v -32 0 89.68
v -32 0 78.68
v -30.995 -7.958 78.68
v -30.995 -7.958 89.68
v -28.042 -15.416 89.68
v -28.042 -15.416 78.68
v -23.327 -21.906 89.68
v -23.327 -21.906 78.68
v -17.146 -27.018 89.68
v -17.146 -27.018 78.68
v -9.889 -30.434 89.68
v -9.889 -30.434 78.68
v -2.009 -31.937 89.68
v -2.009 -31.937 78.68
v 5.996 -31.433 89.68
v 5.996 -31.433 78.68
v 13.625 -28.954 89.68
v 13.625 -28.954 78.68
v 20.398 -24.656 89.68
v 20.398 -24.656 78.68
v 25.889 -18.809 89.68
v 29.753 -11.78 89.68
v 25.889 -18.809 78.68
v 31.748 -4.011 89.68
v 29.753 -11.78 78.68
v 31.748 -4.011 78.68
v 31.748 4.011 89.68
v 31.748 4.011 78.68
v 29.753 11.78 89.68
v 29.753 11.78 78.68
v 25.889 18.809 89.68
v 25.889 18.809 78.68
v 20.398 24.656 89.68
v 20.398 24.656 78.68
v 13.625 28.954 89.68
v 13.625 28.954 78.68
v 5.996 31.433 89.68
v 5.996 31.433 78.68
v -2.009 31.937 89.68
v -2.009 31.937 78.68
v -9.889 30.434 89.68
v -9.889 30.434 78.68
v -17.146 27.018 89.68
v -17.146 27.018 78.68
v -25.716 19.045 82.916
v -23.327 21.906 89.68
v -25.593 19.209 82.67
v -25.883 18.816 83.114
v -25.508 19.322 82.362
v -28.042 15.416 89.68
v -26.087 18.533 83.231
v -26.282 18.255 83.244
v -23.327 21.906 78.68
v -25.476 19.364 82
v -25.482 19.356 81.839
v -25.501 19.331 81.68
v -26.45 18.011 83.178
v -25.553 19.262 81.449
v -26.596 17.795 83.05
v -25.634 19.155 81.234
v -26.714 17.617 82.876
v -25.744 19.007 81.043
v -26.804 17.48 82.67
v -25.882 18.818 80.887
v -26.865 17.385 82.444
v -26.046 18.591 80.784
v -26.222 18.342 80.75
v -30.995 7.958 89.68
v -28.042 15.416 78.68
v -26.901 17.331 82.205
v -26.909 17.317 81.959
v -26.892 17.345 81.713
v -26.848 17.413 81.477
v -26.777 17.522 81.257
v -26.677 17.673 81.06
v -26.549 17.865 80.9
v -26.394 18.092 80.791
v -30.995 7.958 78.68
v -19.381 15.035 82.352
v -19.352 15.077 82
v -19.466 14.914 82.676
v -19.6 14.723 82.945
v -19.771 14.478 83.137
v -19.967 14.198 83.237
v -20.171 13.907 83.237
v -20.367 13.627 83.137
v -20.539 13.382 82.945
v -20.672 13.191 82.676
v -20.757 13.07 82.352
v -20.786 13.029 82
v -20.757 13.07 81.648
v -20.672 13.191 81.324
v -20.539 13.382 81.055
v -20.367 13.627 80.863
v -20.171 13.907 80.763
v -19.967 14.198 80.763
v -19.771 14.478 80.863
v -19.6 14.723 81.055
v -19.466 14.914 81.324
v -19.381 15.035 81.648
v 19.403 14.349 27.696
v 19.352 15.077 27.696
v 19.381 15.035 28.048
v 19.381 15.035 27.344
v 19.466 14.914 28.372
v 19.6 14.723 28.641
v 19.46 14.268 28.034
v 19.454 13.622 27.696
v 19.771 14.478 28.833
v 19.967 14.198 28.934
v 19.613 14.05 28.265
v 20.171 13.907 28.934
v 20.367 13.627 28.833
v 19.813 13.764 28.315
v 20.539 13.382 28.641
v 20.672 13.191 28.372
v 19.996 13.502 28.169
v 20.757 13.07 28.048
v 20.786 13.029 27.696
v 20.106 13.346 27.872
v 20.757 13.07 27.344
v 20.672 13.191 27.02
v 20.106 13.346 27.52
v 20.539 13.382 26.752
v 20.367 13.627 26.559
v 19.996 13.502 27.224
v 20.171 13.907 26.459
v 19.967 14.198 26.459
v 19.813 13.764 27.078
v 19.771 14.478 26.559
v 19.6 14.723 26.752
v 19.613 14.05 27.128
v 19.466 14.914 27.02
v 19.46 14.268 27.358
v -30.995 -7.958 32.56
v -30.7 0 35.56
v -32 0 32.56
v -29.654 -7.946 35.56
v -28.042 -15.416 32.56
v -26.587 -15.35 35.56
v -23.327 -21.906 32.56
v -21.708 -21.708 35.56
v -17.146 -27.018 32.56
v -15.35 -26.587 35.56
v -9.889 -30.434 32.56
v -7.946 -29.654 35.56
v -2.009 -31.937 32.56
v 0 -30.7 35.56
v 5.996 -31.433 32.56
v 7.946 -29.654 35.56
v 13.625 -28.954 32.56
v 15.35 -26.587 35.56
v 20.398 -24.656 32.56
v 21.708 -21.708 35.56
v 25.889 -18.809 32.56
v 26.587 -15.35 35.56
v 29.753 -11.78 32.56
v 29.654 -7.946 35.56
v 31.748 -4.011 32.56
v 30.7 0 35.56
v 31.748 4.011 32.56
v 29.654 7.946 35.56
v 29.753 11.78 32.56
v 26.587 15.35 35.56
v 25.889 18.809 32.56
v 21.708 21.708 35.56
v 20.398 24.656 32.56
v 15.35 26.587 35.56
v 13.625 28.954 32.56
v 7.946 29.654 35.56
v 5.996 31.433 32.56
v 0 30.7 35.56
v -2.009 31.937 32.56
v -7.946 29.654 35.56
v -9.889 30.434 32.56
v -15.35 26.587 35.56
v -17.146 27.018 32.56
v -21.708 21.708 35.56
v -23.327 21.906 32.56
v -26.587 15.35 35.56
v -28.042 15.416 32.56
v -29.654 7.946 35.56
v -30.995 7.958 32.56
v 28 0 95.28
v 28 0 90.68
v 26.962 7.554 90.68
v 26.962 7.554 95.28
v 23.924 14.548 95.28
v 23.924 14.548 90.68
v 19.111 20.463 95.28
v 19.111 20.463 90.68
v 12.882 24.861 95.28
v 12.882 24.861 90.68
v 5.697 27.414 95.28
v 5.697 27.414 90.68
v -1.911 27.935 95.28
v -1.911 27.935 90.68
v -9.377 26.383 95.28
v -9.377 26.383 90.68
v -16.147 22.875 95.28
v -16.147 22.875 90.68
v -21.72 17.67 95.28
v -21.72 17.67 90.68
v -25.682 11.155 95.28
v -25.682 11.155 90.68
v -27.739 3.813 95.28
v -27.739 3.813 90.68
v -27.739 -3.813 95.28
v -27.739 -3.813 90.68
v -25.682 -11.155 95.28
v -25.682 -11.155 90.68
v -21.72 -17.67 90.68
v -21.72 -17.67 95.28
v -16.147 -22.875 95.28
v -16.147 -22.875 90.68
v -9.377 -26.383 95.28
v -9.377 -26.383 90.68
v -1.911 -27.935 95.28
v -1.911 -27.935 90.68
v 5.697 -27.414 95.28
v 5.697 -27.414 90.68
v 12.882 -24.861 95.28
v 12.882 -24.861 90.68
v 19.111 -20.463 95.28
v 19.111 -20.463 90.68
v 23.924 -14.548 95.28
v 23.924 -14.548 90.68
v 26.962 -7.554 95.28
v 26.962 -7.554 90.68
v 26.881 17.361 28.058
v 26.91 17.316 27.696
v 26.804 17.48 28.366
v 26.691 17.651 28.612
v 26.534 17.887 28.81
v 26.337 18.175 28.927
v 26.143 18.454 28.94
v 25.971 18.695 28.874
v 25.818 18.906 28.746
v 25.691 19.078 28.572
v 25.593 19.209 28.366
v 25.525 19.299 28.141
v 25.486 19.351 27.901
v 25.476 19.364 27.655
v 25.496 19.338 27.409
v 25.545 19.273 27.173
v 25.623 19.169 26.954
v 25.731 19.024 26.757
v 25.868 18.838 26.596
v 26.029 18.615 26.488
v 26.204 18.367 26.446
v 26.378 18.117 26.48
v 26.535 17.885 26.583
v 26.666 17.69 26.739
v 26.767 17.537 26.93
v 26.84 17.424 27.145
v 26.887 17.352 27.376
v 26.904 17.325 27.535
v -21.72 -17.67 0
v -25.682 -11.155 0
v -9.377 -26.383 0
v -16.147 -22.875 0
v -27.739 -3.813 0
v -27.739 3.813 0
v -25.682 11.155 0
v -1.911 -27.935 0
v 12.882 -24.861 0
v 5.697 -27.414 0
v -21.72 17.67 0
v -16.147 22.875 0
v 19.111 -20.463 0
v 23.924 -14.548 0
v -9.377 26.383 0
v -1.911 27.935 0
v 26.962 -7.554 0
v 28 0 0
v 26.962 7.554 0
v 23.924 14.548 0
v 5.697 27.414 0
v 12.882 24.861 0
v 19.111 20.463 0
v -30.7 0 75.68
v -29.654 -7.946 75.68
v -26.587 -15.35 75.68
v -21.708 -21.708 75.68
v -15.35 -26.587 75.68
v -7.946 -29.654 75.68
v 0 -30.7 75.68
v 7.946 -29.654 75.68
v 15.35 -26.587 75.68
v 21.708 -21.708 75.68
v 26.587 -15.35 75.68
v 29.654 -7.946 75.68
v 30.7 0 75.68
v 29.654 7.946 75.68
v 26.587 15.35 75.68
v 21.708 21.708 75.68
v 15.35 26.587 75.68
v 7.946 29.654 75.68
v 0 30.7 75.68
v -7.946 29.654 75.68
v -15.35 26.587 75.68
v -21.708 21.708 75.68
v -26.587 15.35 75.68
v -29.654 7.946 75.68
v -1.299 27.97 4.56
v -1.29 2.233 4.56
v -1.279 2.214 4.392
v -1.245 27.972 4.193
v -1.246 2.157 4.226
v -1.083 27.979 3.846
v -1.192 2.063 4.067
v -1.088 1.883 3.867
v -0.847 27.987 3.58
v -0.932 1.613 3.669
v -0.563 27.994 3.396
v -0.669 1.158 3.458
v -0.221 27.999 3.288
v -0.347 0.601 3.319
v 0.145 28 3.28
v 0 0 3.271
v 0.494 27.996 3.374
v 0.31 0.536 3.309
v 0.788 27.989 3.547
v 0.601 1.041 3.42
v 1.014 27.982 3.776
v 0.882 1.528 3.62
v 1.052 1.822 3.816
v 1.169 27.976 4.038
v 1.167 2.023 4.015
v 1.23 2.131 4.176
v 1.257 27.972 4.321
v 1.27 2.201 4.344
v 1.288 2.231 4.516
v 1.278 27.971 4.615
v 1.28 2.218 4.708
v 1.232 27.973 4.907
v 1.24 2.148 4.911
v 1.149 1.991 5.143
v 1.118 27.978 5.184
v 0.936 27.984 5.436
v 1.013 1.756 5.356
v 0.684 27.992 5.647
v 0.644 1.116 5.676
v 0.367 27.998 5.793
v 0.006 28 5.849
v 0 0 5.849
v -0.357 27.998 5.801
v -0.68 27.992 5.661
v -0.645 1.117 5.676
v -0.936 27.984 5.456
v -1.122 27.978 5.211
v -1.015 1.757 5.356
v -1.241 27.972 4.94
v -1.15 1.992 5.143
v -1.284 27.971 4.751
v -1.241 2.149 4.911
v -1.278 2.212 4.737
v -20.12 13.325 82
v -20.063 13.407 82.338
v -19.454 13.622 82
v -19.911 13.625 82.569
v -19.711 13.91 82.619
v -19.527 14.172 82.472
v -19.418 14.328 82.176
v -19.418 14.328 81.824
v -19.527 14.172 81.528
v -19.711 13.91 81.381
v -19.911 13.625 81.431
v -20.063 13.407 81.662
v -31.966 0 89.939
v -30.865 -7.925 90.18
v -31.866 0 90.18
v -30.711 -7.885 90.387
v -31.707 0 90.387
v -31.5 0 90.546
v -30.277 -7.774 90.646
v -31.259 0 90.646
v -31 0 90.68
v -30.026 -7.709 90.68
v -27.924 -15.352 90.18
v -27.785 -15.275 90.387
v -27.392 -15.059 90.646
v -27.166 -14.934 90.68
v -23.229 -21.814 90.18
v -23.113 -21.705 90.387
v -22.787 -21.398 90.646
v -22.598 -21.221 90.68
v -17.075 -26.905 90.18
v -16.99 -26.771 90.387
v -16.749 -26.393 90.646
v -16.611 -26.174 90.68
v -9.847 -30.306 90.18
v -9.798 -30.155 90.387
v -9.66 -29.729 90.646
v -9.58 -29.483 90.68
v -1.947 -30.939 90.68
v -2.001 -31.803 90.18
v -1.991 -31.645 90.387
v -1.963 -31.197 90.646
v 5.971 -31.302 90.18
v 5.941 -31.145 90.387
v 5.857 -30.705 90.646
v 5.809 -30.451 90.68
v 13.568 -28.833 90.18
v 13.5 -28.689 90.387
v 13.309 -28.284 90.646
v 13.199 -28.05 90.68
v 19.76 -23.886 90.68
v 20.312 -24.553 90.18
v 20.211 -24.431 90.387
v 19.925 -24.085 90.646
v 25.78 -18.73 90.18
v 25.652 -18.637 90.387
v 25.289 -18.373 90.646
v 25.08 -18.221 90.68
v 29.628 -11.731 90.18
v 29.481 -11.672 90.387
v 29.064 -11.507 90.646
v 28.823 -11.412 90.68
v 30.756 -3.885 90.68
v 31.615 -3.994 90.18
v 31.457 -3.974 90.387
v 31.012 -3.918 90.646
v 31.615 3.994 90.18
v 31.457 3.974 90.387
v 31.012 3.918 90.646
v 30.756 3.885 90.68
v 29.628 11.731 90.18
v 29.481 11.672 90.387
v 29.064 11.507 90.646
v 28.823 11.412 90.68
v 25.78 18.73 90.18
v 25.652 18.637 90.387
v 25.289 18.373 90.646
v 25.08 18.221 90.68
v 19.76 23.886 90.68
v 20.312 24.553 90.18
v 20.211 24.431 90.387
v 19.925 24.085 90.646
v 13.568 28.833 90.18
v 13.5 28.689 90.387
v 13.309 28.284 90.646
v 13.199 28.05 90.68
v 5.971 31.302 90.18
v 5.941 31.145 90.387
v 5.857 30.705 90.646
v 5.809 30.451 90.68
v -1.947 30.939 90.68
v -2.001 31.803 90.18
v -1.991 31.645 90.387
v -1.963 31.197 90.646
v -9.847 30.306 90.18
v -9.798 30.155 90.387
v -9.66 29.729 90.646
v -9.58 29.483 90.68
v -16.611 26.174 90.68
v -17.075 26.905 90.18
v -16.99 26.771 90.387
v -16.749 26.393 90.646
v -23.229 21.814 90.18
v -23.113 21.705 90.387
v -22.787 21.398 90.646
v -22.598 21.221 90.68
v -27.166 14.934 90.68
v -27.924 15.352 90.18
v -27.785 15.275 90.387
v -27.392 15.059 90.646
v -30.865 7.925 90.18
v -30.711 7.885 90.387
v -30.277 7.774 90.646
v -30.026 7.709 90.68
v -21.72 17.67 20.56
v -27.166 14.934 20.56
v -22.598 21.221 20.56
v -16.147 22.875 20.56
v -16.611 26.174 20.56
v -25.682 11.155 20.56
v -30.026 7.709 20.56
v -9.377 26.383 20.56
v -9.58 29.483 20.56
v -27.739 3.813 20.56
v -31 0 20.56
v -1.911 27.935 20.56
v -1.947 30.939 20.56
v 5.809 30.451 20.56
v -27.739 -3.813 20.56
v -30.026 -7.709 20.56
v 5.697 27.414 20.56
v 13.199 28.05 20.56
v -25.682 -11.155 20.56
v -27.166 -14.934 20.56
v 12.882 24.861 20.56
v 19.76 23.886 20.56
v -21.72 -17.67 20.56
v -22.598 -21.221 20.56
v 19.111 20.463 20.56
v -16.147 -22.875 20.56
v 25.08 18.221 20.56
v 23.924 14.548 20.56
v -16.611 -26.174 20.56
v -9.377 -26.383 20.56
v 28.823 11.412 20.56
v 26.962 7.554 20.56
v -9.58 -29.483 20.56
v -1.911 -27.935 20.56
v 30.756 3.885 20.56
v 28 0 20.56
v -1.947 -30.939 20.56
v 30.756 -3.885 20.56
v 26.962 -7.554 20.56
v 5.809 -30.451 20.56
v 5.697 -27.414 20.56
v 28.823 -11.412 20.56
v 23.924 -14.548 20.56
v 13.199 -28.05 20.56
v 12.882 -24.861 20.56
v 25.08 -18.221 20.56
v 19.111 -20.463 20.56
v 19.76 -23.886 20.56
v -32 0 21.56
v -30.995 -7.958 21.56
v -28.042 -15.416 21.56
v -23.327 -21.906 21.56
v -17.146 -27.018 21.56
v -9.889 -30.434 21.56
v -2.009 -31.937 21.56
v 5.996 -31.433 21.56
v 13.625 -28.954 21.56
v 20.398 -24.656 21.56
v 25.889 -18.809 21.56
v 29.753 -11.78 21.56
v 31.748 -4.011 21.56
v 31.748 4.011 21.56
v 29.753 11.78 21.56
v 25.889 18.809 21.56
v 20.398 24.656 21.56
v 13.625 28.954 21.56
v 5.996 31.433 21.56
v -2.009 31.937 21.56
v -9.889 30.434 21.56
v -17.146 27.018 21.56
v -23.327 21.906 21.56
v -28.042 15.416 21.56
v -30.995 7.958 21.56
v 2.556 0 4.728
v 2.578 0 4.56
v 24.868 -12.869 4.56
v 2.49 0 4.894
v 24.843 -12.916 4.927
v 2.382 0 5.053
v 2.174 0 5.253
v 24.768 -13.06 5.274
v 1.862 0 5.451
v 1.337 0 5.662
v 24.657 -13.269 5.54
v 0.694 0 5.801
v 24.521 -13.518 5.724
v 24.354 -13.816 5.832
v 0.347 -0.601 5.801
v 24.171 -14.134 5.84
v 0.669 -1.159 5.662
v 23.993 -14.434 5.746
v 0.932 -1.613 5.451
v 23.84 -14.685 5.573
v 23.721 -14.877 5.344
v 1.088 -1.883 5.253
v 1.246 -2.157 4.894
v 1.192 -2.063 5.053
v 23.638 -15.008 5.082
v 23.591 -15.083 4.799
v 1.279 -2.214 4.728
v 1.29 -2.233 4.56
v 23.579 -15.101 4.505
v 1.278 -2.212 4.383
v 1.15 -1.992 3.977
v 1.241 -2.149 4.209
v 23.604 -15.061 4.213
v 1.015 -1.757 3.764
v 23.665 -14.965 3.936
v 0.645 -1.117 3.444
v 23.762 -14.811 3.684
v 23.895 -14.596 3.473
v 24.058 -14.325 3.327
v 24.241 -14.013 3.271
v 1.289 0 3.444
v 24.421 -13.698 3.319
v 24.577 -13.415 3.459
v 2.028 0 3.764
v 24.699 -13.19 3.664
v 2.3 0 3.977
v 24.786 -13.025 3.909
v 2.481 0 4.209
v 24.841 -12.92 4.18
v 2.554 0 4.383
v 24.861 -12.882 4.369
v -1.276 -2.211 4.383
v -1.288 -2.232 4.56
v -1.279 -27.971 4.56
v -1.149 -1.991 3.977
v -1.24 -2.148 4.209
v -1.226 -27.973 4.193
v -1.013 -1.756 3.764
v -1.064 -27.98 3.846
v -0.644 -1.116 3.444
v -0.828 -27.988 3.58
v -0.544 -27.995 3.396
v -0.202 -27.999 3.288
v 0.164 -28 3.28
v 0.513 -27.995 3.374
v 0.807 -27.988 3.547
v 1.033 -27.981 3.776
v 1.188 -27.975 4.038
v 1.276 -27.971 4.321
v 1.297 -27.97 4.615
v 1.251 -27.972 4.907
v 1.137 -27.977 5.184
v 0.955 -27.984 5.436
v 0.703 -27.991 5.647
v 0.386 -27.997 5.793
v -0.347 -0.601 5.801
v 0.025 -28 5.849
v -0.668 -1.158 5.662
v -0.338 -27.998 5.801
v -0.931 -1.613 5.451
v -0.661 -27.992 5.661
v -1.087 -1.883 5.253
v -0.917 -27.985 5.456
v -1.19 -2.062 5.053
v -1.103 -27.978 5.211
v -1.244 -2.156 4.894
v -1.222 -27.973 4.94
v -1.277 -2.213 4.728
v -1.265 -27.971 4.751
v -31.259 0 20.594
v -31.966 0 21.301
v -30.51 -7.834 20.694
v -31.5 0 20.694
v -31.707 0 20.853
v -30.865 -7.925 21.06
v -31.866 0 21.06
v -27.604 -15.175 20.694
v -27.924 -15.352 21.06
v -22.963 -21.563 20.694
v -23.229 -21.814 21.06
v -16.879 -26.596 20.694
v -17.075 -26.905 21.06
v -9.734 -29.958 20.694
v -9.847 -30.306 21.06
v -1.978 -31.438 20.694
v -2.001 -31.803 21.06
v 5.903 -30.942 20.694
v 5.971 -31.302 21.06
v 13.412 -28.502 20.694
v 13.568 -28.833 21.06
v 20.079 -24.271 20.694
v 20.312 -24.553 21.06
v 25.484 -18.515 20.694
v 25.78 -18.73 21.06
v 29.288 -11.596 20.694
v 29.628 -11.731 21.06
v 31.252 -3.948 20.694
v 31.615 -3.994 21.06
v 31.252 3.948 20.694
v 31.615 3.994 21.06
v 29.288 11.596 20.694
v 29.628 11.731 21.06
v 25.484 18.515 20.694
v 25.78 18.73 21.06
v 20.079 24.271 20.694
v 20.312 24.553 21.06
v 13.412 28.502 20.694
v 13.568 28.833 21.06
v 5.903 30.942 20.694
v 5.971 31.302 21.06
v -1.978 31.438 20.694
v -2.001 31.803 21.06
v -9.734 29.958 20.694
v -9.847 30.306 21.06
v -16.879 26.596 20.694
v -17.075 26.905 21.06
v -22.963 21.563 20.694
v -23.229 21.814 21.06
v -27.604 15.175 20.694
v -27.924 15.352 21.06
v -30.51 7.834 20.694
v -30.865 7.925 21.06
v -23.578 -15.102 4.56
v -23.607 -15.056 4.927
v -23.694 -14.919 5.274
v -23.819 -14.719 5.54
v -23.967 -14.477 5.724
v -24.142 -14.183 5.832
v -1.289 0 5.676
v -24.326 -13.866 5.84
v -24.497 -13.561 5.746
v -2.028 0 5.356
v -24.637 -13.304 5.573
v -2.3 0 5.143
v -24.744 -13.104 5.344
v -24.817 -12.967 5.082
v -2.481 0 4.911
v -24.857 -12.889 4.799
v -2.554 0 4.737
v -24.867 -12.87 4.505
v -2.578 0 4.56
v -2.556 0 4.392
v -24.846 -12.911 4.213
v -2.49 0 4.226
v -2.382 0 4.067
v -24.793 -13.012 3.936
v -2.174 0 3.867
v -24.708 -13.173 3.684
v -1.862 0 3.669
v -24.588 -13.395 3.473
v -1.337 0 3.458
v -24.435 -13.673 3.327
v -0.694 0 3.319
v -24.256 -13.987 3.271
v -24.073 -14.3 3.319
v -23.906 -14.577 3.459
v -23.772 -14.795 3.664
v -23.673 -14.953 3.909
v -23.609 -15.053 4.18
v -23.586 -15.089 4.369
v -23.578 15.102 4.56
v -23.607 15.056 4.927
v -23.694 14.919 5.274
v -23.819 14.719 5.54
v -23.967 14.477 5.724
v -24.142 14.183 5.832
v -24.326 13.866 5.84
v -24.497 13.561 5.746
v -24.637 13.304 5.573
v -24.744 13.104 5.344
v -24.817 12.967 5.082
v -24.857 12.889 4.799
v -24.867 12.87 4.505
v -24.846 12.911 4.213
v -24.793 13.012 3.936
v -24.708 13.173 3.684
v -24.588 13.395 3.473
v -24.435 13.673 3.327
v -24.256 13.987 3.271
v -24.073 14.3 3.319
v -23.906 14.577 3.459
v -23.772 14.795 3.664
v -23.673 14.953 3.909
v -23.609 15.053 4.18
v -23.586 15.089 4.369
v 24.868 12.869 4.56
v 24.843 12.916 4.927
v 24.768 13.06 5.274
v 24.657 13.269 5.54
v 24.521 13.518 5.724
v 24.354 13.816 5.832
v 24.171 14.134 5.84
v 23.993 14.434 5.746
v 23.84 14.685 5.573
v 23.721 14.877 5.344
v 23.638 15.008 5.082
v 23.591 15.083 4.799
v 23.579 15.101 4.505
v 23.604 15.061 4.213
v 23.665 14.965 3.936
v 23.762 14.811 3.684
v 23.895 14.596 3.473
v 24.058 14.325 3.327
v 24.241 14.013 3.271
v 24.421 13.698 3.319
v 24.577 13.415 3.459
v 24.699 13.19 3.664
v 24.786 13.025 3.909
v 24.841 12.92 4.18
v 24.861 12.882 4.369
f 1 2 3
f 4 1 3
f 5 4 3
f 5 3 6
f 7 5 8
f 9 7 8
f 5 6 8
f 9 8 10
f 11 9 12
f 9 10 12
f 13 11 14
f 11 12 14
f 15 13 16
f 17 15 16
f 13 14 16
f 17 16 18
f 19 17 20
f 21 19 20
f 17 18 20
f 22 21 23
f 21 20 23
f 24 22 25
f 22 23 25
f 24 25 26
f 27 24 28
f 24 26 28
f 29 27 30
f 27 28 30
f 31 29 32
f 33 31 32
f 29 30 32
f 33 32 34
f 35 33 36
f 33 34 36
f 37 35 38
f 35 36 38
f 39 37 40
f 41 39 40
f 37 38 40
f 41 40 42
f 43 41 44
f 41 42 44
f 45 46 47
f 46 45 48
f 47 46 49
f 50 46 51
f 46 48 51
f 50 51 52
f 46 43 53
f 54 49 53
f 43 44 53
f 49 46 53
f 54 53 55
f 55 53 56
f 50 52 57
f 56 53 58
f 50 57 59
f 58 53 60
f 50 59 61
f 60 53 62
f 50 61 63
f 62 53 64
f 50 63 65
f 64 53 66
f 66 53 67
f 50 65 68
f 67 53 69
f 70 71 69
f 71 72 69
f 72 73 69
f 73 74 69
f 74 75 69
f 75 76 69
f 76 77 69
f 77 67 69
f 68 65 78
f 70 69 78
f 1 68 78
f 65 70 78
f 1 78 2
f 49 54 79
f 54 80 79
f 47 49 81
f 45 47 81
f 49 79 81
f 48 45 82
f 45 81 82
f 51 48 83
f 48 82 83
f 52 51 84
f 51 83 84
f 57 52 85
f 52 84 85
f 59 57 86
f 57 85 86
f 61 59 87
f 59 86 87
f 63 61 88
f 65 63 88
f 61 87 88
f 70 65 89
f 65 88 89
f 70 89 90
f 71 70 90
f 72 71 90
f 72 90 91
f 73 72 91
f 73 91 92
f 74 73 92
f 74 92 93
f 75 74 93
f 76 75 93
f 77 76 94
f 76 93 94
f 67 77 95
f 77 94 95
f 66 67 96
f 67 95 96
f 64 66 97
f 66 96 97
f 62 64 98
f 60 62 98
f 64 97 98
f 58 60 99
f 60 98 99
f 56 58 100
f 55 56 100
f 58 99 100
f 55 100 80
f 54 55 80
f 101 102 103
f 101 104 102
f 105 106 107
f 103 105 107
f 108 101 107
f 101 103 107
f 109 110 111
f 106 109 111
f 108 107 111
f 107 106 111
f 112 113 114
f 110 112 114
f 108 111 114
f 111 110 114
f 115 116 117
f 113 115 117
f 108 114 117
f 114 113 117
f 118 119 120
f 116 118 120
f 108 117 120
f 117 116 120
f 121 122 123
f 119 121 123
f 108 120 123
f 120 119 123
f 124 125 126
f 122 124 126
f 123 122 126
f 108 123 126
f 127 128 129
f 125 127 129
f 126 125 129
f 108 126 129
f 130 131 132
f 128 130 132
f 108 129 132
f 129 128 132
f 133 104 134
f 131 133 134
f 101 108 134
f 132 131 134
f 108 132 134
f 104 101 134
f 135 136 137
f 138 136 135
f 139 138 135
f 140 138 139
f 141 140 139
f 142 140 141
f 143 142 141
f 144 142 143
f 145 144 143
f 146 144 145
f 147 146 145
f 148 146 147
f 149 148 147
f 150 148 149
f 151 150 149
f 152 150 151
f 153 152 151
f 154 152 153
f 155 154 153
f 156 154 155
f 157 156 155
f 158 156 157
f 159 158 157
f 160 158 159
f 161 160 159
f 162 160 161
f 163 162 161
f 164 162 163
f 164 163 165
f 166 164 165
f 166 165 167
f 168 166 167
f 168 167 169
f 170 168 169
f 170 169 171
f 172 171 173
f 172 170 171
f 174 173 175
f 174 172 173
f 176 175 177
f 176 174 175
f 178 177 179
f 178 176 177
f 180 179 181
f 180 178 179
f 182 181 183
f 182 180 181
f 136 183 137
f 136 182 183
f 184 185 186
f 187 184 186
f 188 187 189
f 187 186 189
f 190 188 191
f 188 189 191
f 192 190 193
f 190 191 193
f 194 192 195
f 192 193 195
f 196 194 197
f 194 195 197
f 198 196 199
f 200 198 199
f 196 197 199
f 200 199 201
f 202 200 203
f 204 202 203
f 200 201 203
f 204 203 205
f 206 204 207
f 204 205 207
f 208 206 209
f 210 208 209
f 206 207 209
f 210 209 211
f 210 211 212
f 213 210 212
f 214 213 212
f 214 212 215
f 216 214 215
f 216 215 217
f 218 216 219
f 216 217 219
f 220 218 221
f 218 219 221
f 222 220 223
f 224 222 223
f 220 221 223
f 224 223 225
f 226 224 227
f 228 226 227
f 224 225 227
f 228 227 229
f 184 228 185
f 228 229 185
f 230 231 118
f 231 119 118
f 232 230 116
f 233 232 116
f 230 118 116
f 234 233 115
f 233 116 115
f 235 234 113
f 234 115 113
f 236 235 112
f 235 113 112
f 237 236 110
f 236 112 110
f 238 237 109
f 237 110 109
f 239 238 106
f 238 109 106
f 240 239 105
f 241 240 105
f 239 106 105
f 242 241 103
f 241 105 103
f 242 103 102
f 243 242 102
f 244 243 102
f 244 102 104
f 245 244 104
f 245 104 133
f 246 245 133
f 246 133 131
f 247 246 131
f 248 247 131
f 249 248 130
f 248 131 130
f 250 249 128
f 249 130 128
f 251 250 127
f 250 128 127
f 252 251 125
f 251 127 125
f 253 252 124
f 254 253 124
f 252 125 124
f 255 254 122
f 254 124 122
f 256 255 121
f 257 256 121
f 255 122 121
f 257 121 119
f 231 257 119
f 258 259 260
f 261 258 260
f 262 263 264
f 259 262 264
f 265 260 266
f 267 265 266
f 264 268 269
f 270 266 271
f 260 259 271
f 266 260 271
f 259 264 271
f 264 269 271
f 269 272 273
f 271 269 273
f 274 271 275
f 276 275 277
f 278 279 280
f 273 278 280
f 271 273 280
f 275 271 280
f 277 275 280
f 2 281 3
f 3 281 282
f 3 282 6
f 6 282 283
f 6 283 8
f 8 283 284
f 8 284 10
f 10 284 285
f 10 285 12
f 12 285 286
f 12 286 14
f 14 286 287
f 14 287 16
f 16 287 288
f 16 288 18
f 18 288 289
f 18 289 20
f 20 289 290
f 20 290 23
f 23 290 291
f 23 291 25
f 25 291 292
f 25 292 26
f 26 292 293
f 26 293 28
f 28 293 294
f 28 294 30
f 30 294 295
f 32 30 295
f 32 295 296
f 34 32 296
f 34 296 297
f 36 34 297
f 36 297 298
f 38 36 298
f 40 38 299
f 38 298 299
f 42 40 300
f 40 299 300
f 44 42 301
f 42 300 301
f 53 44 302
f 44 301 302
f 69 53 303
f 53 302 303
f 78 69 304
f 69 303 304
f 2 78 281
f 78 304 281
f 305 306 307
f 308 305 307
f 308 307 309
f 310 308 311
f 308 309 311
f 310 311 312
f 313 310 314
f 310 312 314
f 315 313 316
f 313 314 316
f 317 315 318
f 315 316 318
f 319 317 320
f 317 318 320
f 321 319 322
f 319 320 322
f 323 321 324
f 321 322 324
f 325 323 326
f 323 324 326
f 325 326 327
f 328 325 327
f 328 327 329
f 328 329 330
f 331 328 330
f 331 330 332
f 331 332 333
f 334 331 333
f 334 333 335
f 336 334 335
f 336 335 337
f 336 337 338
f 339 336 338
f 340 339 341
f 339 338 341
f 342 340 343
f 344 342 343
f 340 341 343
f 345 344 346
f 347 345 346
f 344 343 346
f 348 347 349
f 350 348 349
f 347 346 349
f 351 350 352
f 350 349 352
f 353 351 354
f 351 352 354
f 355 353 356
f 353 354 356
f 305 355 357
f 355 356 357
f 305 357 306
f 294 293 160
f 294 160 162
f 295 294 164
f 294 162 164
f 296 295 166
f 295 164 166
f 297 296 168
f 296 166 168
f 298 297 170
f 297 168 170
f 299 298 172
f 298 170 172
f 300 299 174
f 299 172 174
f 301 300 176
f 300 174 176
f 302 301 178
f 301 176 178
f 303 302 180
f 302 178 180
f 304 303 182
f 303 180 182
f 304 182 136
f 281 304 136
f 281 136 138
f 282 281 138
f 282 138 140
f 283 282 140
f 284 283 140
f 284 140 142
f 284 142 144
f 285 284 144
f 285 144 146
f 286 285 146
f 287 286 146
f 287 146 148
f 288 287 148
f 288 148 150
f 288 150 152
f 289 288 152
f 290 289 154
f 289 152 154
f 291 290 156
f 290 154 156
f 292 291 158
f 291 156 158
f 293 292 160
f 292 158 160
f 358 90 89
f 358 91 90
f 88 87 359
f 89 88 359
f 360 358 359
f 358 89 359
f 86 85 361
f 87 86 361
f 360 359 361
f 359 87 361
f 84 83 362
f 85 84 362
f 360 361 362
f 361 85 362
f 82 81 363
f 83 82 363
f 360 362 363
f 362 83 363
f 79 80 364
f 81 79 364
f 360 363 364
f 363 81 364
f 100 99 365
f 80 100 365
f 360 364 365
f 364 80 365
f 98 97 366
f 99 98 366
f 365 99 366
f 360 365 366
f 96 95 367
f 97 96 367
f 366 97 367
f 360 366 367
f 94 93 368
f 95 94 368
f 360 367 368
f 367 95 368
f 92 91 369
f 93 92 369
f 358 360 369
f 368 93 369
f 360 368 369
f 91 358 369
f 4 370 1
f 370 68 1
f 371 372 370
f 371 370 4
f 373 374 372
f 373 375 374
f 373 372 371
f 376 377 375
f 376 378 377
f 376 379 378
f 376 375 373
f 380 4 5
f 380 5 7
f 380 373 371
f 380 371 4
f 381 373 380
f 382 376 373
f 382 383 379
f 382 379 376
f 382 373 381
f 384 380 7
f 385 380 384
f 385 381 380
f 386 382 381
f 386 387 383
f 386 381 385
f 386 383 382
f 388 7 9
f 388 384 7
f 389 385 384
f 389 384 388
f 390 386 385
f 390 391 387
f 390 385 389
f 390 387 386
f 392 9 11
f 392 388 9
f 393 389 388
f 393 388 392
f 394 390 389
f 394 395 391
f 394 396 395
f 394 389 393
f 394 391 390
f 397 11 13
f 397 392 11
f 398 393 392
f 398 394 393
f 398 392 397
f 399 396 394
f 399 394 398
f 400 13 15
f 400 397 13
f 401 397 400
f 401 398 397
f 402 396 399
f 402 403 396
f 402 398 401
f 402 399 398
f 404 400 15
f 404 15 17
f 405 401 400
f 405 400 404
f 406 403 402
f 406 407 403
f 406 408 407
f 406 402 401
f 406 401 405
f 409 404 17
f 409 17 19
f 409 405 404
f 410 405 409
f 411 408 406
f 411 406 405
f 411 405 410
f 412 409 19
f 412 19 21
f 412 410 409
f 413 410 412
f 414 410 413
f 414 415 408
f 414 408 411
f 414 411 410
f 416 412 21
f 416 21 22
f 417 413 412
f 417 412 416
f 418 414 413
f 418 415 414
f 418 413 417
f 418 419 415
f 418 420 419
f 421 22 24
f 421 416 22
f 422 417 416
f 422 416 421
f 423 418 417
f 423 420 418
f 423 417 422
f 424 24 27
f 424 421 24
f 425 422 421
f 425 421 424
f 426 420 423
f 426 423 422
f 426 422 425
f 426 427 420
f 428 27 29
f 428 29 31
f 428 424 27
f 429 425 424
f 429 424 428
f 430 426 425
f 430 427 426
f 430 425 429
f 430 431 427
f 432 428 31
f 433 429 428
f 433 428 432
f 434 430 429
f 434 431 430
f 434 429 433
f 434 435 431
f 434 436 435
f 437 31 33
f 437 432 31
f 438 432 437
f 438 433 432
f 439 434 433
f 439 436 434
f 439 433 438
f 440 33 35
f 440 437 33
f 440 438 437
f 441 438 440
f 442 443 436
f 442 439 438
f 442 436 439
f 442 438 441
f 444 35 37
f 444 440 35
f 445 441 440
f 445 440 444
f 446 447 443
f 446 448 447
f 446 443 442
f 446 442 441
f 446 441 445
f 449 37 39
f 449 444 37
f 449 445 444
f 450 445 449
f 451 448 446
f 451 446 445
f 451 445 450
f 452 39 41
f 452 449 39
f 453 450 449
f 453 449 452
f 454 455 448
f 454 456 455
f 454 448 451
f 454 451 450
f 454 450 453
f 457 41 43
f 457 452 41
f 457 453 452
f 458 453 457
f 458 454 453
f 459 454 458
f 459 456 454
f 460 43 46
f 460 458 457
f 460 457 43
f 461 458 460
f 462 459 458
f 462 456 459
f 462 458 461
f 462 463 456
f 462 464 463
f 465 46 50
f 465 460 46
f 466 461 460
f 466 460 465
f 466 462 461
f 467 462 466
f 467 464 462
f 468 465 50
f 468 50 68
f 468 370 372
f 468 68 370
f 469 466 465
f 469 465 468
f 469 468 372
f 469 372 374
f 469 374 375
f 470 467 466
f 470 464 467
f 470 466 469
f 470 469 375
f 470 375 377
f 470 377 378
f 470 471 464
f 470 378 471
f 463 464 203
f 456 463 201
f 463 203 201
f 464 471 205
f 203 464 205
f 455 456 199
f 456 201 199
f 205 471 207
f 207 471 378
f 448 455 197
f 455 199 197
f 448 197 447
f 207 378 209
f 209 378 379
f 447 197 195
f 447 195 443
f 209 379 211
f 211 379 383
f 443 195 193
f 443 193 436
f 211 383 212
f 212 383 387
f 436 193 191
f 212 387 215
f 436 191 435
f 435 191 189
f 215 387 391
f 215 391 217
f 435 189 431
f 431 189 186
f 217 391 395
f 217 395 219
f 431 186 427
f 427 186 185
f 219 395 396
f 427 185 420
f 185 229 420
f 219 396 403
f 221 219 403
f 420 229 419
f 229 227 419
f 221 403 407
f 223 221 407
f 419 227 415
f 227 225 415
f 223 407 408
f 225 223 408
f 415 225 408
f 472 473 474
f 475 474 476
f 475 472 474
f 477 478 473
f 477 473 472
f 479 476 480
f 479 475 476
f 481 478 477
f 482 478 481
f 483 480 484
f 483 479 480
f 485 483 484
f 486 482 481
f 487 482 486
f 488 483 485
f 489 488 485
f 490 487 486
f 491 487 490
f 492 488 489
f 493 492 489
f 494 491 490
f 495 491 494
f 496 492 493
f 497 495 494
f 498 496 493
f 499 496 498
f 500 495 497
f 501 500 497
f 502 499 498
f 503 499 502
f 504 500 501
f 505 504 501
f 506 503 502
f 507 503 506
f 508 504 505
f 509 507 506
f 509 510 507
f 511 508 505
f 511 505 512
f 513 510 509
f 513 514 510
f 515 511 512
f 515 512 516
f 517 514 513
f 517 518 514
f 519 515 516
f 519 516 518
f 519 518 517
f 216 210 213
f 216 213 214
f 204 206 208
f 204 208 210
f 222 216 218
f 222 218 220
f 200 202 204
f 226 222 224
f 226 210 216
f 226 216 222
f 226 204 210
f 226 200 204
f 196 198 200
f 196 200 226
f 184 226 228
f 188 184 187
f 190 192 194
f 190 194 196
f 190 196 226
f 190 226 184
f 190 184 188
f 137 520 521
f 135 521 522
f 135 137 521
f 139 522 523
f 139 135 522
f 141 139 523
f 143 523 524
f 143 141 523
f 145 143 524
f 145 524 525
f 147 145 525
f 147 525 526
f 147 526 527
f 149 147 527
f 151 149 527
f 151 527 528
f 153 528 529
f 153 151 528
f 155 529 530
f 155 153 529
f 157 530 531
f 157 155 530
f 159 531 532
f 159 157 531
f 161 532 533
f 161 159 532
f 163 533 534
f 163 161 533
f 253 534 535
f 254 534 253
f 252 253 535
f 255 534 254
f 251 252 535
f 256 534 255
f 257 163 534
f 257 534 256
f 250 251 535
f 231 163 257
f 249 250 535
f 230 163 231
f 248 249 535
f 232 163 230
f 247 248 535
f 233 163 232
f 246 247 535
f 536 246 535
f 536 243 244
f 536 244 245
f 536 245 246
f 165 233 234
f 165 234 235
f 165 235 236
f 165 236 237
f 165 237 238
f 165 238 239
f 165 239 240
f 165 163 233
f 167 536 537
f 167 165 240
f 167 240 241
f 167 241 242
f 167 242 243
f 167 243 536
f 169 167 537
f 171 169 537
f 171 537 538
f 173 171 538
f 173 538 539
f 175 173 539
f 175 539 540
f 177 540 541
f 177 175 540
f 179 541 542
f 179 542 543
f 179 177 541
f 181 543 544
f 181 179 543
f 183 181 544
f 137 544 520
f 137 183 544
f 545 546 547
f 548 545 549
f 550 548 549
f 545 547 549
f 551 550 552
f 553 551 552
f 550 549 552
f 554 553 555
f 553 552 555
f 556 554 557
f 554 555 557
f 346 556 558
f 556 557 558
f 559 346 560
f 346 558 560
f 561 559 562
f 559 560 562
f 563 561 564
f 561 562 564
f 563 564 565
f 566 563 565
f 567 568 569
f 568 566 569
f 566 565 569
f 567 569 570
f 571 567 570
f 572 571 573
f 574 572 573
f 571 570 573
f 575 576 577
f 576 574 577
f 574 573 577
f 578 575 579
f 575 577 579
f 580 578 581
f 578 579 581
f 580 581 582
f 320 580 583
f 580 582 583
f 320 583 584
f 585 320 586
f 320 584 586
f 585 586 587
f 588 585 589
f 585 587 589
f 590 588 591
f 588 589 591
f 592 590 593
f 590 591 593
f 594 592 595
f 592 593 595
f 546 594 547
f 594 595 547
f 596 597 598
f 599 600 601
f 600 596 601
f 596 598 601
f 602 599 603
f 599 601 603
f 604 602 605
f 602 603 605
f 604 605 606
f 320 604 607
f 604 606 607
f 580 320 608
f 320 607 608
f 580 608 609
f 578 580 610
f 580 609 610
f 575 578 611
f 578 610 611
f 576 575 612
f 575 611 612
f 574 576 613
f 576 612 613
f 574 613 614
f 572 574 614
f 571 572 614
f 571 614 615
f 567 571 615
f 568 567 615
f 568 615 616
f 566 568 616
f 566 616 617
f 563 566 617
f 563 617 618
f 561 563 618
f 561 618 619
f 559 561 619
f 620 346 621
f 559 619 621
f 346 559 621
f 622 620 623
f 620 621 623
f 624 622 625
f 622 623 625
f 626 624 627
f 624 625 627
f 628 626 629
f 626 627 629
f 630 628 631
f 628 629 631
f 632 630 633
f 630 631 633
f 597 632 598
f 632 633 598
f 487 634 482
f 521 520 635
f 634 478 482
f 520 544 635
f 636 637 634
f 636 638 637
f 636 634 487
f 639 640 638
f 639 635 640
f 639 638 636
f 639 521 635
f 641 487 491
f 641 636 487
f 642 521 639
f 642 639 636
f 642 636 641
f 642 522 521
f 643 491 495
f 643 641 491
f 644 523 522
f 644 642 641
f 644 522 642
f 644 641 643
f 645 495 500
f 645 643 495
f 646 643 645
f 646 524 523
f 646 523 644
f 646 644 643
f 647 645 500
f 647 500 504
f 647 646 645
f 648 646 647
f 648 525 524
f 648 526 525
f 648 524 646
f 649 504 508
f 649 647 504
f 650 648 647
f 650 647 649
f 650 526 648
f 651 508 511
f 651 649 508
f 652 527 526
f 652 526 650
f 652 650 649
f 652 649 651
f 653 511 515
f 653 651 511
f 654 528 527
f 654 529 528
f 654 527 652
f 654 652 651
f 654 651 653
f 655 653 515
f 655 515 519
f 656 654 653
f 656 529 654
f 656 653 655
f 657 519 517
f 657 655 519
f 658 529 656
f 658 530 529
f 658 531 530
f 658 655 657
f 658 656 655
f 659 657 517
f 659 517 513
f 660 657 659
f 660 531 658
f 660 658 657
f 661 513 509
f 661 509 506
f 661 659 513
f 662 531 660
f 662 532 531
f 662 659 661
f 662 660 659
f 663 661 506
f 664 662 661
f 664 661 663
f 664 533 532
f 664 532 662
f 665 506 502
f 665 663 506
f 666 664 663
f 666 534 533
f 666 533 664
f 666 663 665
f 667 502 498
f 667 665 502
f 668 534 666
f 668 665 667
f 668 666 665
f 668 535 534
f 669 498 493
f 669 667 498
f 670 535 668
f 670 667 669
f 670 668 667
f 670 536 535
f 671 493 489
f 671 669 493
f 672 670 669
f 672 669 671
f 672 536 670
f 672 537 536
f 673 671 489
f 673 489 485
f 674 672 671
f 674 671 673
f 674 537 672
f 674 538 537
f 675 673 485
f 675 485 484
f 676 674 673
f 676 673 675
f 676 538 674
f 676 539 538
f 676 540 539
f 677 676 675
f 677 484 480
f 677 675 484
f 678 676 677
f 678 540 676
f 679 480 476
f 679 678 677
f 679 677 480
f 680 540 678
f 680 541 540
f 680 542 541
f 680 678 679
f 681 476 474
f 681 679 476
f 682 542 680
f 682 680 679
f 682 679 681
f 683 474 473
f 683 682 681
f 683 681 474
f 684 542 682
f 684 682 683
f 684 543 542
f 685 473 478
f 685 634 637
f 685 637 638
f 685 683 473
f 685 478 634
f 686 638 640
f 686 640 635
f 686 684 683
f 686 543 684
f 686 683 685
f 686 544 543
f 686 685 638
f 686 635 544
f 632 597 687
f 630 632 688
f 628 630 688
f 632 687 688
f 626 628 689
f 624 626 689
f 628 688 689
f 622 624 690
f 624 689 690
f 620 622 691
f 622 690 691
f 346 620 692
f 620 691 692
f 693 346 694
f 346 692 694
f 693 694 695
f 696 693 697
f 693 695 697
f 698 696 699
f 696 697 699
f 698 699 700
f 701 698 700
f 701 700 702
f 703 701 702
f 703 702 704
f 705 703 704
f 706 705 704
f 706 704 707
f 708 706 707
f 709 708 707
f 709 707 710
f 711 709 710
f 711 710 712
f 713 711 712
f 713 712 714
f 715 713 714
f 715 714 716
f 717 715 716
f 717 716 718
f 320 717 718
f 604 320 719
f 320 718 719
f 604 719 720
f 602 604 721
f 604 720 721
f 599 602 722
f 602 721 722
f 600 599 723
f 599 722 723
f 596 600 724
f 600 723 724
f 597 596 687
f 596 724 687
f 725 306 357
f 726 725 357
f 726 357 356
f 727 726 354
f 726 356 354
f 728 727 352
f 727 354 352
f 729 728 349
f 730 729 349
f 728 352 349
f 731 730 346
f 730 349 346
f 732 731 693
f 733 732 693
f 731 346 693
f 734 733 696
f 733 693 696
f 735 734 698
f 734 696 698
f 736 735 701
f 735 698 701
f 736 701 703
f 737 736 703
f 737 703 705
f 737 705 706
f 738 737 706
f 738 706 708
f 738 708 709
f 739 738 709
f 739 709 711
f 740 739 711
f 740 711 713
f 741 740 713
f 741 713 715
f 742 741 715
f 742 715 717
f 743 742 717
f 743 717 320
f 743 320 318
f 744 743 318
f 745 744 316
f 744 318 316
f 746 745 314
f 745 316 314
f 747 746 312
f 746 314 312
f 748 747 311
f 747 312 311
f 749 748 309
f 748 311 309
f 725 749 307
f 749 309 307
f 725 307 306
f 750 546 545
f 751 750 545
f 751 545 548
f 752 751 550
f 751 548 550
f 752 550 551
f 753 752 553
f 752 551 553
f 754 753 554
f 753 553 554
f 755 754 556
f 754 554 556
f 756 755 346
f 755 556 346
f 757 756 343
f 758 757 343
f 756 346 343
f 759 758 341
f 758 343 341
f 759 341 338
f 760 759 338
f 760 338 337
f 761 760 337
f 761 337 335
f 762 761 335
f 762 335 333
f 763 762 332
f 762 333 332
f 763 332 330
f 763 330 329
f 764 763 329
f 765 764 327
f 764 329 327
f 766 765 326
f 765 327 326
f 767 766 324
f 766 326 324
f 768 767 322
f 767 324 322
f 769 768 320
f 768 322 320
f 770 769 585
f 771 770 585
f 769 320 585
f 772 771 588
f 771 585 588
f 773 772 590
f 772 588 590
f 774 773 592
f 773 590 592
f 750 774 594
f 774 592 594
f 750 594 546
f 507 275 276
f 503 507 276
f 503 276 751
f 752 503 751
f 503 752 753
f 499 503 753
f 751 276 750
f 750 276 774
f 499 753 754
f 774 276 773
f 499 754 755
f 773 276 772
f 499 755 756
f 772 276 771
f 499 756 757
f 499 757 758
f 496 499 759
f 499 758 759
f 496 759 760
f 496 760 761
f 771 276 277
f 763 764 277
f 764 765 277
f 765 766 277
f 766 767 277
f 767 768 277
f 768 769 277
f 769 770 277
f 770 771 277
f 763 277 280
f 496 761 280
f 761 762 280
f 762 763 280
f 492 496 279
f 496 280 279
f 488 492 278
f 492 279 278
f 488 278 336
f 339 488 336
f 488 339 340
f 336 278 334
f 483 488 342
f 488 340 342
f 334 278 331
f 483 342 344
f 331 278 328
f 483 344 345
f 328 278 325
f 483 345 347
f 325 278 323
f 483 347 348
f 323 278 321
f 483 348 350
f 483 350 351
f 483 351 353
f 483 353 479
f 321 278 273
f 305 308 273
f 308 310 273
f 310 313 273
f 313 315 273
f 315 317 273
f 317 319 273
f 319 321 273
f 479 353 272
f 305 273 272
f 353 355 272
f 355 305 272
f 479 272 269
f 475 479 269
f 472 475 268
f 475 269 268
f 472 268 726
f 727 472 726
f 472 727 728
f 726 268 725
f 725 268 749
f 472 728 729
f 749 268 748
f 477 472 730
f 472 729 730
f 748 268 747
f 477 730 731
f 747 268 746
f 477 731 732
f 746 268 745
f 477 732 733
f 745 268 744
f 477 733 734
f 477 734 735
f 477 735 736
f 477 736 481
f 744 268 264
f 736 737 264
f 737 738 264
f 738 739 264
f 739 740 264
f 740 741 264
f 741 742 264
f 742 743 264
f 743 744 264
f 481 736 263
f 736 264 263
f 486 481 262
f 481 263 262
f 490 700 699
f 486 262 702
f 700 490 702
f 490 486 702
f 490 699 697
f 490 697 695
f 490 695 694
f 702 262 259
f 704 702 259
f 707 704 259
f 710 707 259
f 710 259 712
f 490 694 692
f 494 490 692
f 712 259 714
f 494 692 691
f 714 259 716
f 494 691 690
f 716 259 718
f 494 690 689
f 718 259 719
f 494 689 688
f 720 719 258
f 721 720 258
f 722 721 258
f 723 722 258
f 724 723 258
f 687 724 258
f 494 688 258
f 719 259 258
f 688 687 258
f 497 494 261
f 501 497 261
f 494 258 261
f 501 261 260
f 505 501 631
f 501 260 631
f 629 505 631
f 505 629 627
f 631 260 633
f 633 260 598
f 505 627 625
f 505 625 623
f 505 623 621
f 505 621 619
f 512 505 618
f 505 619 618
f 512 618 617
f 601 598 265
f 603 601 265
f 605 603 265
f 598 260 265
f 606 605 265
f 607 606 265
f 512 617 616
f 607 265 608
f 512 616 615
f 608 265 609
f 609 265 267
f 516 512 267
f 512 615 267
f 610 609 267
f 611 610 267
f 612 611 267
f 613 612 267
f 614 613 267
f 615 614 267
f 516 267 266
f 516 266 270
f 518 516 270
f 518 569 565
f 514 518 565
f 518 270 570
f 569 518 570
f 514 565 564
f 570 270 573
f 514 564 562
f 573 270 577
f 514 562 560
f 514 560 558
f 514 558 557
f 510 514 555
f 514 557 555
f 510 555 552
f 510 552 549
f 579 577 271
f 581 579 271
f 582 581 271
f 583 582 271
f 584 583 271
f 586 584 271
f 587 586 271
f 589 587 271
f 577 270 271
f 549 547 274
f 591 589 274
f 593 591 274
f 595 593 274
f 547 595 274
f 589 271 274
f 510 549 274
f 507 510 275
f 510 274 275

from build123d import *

# Parameters (mm, degrees)
SKETCH1_R                           = 28
BOSS_EXTRUDE1_DEPTH                 = 20.56
SKETCH2_R                           = 30.7
BOSS_EXTRUDE2_DEPTH                 = 70.12
SKETCH3_R                           = 28
BOSS_EXTRUDE3_DEPTH                 = 4.6
F_5_40_TAPPED_HOLE1_D               = 2.5781
F_5_40_TAPPED_HOLE1_ON_FACE_2_D     = 2.5781
F_5_40_TAPPED_HOLE1_ON_FACE_3_D     = 2.5781
M3X0_5_TAPPED_HOLE1_D               = 2.5
M3X0_5_TAPPED_HOLE1_DEPTH           = 7.5
M3X0_5_TAPPED_HOLE1_TIP             = 0.751075774
M3X0_5_TAPPED_HOLE1_ON_FACE_2_D     = 2.5
M3X0_5_TAPPED_HOLE1_ON_FACE_2_DEPTH = 7.5
M3X0_5_TAPPED_HOLE1_ON_FACE_2_TIP   = 0.751075774
FILLET1_R                           = 1


with BuildPart() as part:
    # Sketch1 → Boss-Extrude1 (new body)
    with BuildSketch(Plane.XY):
        Circle(SKETCH1_R)
    extrude(amount=BOSS_EXTRUDE1_DEPTH)

    # Sketch2 → Boss-Extrude2 (add)
    with BuildSketch(Plane.XY.offset(20.56)):
        Circle(SKETCH2_R)
    extrude(amount=BOSS_EXTRUDE2_DEPTH)

    # Sketch3 → Boss-Extrude3 (add)
    with BuildSketch(Plane.XY.offset(90.68)):
        Circle(SKETCH3_R)
    extrude(amount=BOSS_EXTRUDE3_DEPTH)

    # Sketch4 → Revolve1 (revolve)
    with BuildSketch(Plane(origin=(0, 0, 0), x_dir=(0, 0, -1), z_dir=(1, 0, 0)), mode=Mode.PRIVATE) as revolve1_sk:
        Polygon((-20.56, 30.7), (-20.56, 32), (-32.56, 32), (-35.56, 30.7), align=None)
        Polygon((-75.68, 30.7), (-90.68, 30.7), (-90.68, 32), (-78.68, 32), align=None)
    revolve(revolve1_sk.sketch.rotate(Axis((0, 0, 0), (0, 0, 1)), 90), axis=Axis((0, 0, 0), (0, 0, 1)))

    # #5-40 Tapped Hole1 (through all)
    with Locations(Plane(origin=(24.248711306, 14, 4.56), x_dir=(-0.5, 0.866025403784, 0), z_dir=(0.866025403784, 0.5, 0))):
        with Locations((0, 0)):
            Hole(F_5_40_TAPPED_HOLE1_D / 2)

    # #5-40 Tapped Hole1 on face 2 (through all)
    with Locations(Plane(origin=(-0.009573975, 27.999998363, 4.56), x_dir=(0.999999941518, 0.00034199998, 0), z_dir=(-0.00034199998, 0.999999941518, 0))):
        with Locations((0, 0)):
            Hole(F_5_40_TAPPED_HOLE1_ON_FACE_2_D / 2)

    # #5-40 Tapped Hole1 on face 3 (through all)
    with Locations(Plane(origin=(-24.248711306, 14, 4.56), x_dir=(-0.500000174844, -0.866025302838, 0), z_dir=(-0.866025302838, 0.500000174844, 0))):
        with Locations((0, 0)):
            Hole(F_5_40_TAPPED_HOLE1_ON_FACE_3_D / 2)

    # M3x0.5 Tapped Hole1
    with Locations(Plane(origin=(26.212865417, 18.354445963, 27.696295827), x_dir=(-0.573576436351, 0.819152044289, 0), z_dir=(0.819152044289, 0.573576436351, 0))):
        with Locations((0, 0)):
            Hole(M3X0_5_TAPPED_HOLE1_D / 2, depth=M3X0_5_TAPPED_HOLE1_DEPTH)
            with Locations((0, 0, -(M3X0_5_TAPPED_HOLE1_DEPTH + M3X0_5_TAPPED_HOLE1_TIP / 2))):  # 118° drill point
                Cone(0, M3X0_5_TAPPED_HOLE1_D / 2, M3X0_5_TAPPED_HOLE1_TIP, mode=Mode.SUBTRACT)

    # M3x0.5 Tapped Hole1 on face 2
    with Locations(Plane(origin=(-26.212865417, 18.354445963, 82), x_dir=(-0.573576164364, -0.819152234736, 0), z_dir=(-0.819152234736, 0.573576164364, 0))):
        with Locations((0, 0)):
            Hole(M3X0_5_TAPPED_HOLE1_ON_FACE_2_D / 2, depth=M3X0_5_TAPPED_HOLE1_ON_FACE_2_DEPTH)
            with Locations((0, 0, -(M3X0_5_TAPPED_HOLE1_ON_FACE_2_DEPTH + M3X0_5_TAPPED_HOLE1_ON_FACE_2_TIP / 2))):  # 118° drill point
                Cone(0, M3X0_5_TAPPED_HOLE1_ON_FACE_2_D / 2, M3X0_5_TAPPED_HOLE1_ON_FACE_2_TIP, mode=Mode.SUBTRACT)

    # Fillet1
    fillet1_edges = [part.edges().sort_by_distance(p)[0] for p in [
        (32, 0, 20.56),
        (32, 0, 90.68),
    ]]
    fillet(fillet1_edges, radius=FILLET1_R)


solid = part.part
